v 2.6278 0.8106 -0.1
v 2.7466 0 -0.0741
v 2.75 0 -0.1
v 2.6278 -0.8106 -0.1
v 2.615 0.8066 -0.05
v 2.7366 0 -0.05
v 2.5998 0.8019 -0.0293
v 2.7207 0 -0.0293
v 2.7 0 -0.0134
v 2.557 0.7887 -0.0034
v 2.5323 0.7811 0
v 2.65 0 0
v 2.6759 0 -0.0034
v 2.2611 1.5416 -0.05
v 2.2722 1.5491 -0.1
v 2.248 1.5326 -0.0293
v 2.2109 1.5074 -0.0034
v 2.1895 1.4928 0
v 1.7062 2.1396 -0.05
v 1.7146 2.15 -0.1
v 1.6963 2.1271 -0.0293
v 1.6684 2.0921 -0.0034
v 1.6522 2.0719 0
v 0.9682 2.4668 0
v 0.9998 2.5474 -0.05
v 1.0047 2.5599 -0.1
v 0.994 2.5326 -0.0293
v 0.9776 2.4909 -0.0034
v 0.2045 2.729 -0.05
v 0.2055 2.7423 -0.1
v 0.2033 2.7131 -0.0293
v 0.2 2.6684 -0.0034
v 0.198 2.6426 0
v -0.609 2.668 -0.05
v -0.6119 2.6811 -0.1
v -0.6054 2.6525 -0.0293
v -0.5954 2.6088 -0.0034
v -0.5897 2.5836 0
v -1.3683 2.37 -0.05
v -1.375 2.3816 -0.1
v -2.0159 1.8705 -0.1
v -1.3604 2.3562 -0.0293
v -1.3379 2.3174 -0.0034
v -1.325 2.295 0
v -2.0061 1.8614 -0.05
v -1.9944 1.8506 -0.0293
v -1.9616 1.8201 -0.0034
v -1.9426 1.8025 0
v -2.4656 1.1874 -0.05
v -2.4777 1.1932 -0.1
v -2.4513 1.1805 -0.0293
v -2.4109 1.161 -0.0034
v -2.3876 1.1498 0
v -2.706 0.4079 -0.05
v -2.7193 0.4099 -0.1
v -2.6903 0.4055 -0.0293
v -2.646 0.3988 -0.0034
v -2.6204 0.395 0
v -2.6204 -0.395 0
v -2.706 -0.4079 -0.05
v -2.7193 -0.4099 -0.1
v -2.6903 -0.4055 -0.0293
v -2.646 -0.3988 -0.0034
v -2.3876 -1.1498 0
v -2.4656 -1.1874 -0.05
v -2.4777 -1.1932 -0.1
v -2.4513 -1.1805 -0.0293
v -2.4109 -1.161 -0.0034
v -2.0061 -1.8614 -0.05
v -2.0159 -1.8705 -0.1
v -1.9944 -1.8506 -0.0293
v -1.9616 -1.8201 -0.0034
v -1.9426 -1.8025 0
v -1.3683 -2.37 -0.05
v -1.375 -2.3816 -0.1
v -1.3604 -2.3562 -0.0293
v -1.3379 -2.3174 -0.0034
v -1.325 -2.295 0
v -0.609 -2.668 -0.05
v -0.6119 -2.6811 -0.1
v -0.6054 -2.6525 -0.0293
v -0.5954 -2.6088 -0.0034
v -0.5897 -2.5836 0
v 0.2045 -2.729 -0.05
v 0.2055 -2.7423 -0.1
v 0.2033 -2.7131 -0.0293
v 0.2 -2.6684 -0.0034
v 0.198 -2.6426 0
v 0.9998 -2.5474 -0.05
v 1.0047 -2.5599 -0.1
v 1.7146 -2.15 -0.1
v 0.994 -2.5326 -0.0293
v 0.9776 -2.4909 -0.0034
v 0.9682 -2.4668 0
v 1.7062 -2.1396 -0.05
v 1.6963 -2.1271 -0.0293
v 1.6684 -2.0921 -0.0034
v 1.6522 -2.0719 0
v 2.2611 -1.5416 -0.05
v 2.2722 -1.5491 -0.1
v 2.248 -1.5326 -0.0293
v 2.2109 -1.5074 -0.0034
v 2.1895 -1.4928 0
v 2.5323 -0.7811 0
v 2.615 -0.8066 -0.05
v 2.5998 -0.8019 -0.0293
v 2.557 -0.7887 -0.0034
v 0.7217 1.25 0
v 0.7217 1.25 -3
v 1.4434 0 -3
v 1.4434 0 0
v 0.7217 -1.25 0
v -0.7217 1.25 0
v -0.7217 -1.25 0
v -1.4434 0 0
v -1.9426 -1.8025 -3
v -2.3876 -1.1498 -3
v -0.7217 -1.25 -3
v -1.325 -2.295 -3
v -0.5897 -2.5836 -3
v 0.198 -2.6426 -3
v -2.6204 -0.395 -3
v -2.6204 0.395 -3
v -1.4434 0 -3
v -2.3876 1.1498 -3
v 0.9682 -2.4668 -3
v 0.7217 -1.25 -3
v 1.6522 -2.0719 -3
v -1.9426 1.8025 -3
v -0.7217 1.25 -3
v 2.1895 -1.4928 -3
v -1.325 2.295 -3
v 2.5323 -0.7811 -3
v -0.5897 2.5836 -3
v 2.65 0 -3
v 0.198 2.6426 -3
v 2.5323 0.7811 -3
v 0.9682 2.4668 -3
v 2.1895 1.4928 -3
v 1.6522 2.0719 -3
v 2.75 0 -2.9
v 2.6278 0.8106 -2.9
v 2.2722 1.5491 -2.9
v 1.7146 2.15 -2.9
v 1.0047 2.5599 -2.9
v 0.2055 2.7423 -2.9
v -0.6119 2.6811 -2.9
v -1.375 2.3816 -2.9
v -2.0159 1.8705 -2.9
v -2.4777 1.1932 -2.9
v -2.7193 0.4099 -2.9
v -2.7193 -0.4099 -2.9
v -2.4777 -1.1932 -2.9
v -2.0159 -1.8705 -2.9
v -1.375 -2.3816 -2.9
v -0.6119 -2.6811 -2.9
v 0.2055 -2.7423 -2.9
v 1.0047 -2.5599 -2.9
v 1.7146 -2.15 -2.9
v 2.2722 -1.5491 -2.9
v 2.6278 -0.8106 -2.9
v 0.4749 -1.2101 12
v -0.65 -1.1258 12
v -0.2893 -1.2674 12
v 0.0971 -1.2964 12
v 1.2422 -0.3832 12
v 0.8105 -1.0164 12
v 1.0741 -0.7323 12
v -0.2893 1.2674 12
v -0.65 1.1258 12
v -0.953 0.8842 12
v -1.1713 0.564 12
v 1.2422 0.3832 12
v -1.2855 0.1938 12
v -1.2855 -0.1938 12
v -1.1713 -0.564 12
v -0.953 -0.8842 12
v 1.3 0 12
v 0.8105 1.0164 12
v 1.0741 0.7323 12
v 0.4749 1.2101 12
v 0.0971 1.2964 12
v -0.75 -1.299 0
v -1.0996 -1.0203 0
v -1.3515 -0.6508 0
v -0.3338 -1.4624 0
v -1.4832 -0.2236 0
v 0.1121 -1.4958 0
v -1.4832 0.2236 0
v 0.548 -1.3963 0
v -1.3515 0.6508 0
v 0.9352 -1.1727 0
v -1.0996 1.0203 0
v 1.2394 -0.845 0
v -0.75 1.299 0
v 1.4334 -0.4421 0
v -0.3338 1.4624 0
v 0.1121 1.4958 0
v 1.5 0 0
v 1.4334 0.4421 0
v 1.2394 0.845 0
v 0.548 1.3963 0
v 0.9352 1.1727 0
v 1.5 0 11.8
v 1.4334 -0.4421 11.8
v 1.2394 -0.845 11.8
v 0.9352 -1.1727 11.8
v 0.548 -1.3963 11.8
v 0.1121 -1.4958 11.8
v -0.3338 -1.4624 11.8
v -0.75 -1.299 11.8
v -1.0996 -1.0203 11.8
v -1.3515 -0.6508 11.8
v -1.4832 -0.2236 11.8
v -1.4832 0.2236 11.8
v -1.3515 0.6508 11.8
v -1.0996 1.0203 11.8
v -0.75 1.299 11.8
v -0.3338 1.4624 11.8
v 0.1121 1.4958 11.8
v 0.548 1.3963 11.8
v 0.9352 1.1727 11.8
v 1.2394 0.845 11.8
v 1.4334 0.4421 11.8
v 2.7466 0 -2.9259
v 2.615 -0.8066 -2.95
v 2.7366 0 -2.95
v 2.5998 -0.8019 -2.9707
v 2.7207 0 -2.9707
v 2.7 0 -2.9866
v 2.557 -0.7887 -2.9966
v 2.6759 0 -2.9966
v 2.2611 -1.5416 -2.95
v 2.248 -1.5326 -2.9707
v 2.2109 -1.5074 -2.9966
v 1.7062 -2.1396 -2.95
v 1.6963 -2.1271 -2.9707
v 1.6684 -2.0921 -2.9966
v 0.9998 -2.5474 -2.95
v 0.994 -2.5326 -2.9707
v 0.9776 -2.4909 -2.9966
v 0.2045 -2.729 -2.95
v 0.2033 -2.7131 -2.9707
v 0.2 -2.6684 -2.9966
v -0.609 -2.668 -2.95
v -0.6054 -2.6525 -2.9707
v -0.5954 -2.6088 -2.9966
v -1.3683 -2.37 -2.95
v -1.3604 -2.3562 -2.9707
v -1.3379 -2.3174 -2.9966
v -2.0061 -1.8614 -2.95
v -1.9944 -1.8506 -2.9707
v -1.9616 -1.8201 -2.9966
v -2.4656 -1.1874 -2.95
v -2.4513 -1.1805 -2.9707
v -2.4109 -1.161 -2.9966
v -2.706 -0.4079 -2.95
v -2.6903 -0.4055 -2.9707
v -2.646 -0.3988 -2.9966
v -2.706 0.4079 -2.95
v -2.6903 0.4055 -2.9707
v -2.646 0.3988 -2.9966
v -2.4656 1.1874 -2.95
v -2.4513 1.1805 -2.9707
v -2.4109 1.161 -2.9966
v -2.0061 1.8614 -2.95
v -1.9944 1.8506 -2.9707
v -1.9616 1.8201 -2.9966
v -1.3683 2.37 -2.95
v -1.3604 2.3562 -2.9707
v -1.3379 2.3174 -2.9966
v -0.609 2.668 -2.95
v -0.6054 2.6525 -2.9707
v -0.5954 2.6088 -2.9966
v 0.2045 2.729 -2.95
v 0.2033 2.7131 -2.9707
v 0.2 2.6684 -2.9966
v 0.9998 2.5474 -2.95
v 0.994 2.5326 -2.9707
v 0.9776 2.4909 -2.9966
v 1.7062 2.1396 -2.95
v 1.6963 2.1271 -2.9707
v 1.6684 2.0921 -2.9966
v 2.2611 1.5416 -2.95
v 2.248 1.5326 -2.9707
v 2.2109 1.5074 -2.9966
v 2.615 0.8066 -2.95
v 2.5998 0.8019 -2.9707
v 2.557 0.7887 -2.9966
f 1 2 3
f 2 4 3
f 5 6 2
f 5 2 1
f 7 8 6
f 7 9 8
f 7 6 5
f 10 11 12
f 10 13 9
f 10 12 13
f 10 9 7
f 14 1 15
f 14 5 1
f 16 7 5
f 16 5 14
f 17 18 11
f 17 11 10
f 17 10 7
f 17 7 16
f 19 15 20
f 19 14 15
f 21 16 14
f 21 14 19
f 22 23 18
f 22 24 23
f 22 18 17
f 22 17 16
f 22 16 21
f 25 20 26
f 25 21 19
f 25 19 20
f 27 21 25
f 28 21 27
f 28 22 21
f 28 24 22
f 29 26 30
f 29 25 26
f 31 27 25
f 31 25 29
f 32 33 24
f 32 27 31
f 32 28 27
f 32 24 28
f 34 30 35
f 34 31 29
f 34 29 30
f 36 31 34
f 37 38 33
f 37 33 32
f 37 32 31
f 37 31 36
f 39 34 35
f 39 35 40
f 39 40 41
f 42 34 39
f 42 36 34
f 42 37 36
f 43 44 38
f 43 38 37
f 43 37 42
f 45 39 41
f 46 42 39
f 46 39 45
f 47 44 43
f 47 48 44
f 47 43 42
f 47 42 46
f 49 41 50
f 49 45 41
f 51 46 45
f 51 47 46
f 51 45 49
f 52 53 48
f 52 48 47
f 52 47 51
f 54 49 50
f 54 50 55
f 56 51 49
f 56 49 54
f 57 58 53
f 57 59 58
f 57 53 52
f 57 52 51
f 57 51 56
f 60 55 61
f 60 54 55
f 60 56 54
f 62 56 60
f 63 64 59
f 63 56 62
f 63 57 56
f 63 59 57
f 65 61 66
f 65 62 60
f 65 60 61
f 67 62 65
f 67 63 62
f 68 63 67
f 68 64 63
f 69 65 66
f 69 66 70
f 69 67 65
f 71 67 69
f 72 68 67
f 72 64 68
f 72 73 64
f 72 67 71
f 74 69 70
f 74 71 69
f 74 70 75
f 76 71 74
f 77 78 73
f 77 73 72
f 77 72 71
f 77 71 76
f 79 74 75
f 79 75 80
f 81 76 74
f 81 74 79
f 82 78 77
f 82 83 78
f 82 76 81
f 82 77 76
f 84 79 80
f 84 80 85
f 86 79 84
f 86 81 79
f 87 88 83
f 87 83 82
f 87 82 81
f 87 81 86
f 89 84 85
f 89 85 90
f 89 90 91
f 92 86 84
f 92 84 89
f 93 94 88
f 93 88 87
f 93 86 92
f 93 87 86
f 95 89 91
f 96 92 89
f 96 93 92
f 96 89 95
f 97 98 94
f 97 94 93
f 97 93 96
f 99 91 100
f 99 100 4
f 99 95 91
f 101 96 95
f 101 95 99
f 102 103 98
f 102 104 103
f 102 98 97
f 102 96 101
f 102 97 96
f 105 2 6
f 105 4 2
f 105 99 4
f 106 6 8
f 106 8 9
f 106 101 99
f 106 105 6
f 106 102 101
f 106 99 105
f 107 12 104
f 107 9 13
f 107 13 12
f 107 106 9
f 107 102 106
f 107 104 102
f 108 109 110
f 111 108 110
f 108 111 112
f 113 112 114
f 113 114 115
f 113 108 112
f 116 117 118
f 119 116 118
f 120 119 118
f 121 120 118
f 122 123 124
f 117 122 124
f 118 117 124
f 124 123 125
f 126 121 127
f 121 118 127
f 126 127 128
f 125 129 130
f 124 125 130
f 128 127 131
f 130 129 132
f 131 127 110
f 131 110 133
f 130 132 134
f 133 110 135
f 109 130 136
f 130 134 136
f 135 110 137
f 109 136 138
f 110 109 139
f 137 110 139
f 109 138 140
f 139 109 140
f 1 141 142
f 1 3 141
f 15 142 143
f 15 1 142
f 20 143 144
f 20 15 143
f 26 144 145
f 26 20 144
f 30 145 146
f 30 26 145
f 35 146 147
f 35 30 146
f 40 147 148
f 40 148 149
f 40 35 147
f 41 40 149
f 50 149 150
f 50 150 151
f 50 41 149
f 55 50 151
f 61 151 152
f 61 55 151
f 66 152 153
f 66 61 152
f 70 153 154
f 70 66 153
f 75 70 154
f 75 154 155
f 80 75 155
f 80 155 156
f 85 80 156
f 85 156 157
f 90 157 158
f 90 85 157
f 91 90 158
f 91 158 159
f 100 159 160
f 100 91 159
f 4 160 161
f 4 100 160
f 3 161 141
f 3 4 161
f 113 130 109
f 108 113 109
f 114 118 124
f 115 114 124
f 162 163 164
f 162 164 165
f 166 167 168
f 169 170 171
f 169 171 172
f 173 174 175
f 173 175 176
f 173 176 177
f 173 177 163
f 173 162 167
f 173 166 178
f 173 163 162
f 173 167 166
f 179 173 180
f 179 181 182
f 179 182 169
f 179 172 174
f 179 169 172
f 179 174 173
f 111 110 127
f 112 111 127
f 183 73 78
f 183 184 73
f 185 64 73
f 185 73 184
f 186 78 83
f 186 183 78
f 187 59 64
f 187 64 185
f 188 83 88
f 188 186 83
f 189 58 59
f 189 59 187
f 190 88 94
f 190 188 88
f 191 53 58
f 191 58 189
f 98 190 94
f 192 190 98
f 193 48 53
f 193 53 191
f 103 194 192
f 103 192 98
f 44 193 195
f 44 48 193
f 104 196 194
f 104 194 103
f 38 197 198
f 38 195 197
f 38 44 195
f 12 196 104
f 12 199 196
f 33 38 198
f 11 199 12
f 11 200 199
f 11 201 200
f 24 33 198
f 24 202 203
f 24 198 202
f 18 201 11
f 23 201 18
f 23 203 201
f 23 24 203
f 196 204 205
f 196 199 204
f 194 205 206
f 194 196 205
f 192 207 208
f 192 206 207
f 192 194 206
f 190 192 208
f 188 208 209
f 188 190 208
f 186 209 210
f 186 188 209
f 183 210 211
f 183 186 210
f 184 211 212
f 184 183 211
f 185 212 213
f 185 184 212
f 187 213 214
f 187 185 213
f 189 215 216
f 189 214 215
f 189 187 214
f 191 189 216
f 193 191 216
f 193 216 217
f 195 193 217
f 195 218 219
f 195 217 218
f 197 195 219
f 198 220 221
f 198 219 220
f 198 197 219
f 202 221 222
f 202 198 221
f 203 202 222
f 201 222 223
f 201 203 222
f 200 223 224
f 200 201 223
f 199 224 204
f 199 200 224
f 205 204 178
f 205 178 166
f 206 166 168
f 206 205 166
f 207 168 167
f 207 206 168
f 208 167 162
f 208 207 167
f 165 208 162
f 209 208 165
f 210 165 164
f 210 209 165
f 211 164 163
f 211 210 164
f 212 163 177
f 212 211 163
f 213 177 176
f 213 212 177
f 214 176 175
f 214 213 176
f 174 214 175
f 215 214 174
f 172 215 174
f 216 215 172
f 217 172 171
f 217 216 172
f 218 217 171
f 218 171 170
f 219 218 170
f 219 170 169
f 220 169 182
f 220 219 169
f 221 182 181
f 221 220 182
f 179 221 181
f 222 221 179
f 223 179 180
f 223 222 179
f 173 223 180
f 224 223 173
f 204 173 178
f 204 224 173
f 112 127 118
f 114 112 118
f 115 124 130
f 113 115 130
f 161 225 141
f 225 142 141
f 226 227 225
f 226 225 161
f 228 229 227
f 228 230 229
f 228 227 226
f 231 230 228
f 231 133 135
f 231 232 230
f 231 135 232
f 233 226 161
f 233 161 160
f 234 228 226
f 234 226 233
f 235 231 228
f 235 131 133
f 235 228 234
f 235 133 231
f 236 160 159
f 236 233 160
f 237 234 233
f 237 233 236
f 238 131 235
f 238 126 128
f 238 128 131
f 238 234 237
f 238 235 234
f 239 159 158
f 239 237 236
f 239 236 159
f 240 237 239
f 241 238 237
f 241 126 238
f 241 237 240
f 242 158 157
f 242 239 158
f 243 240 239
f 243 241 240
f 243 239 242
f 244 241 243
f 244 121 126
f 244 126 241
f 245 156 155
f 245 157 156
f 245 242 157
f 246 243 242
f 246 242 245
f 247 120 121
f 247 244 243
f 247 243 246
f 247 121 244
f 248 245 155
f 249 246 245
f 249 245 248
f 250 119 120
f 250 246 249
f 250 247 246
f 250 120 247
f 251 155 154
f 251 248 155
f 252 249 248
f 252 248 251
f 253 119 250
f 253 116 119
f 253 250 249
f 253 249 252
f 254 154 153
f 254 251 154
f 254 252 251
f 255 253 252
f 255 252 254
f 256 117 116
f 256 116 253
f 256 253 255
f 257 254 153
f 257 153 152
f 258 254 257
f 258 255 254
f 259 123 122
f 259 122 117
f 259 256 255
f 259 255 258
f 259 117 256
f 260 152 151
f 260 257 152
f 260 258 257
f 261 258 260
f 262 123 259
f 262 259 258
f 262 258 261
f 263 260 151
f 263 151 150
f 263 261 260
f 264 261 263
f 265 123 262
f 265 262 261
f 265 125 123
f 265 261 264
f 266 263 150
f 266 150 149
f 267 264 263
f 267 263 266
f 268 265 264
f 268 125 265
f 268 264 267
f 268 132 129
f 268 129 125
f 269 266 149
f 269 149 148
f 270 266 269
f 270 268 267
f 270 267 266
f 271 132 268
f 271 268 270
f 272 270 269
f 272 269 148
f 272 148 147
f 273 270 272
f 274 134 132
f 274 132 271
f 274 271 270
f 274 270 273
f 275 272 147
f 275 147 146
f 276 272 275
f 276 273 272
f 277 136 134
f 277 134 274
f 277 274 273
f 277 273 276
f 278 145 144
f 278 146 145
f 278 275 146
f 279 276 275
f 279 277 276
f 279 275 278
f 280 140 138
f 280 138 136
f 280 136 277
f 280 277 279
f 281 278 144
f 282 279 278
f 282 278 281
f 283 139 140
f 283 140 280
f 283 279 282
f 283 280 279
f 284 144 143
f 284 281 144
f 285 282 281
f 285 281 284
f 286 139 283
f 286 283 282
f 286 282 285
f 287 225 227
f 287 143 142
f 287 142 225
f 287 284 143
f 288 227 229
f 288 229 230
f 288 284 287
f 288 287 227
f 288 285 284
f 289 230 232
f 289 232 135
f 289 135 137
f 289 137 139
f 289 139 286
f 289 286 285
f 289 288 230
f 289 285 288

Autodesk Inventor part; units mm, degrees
ref_plane "YZ Plane" through (0, 0, 0) normal (1, 0, 0) x (0, 1, 0)
ref_plane "XZ Plane" through (0, 0, 0) normal (0, 1, 0) x (-1, 0, 0)
ref_plane "XY Plane" through (0, 0, 0) normal (0, 0, 1) x (1, 0, 0)
sketch "Sketch1" plane through (0, 0, 0) normal (0, 0, 1) x (1, 0, 0)
  circle A0 centre (0, 0) radius 2.75
extrude "Extrusion3" add sketch "Sketch1" against normal blind 3
sketch "Sketch2" plane through (0, 0, 0) normal (0, 0, 1) x (1, 0, 0)
  circle A0 centre (0, 0) radius 1.5
extrude "Extrusion2" add sketch "Sketch2" along normal blind 12
sketch "Sketch3" plane through (0, 0, -3) normal (0, 0, -1) x (-1, 0, 0)
  line L0 (-0.7217, 1.25) -> (-1.4434, 0)
  line L1 (0.7217, -1.25) -> (1.4434, 0)
  line L2 (1.4434, 0) -> (0.7217, 1.25)
  line L3 (-1.4434, 0) -> (-0.7217, -1.25)
  line L4 (0.7217, 1.25) -> (-0.7217, 1.25)
  line L5 (-0.7217, -1.25) -> (0.7217, -1.25)
extrude "Extrusion1" cut sketch "Sketch3" against normal blind 3
fillet "Fillet2" radius 0.1 1 edges at (-2.75, 0, -3)
fillet "Fillet1" radius 0.1 1 edges at (-2.75, 0, 0)
chamfer "Chamfer1" distance 0.2 angle 45 1 edges at (-1.5, 0, 12)
properties part number "DIN 912 M3 12 mm"
